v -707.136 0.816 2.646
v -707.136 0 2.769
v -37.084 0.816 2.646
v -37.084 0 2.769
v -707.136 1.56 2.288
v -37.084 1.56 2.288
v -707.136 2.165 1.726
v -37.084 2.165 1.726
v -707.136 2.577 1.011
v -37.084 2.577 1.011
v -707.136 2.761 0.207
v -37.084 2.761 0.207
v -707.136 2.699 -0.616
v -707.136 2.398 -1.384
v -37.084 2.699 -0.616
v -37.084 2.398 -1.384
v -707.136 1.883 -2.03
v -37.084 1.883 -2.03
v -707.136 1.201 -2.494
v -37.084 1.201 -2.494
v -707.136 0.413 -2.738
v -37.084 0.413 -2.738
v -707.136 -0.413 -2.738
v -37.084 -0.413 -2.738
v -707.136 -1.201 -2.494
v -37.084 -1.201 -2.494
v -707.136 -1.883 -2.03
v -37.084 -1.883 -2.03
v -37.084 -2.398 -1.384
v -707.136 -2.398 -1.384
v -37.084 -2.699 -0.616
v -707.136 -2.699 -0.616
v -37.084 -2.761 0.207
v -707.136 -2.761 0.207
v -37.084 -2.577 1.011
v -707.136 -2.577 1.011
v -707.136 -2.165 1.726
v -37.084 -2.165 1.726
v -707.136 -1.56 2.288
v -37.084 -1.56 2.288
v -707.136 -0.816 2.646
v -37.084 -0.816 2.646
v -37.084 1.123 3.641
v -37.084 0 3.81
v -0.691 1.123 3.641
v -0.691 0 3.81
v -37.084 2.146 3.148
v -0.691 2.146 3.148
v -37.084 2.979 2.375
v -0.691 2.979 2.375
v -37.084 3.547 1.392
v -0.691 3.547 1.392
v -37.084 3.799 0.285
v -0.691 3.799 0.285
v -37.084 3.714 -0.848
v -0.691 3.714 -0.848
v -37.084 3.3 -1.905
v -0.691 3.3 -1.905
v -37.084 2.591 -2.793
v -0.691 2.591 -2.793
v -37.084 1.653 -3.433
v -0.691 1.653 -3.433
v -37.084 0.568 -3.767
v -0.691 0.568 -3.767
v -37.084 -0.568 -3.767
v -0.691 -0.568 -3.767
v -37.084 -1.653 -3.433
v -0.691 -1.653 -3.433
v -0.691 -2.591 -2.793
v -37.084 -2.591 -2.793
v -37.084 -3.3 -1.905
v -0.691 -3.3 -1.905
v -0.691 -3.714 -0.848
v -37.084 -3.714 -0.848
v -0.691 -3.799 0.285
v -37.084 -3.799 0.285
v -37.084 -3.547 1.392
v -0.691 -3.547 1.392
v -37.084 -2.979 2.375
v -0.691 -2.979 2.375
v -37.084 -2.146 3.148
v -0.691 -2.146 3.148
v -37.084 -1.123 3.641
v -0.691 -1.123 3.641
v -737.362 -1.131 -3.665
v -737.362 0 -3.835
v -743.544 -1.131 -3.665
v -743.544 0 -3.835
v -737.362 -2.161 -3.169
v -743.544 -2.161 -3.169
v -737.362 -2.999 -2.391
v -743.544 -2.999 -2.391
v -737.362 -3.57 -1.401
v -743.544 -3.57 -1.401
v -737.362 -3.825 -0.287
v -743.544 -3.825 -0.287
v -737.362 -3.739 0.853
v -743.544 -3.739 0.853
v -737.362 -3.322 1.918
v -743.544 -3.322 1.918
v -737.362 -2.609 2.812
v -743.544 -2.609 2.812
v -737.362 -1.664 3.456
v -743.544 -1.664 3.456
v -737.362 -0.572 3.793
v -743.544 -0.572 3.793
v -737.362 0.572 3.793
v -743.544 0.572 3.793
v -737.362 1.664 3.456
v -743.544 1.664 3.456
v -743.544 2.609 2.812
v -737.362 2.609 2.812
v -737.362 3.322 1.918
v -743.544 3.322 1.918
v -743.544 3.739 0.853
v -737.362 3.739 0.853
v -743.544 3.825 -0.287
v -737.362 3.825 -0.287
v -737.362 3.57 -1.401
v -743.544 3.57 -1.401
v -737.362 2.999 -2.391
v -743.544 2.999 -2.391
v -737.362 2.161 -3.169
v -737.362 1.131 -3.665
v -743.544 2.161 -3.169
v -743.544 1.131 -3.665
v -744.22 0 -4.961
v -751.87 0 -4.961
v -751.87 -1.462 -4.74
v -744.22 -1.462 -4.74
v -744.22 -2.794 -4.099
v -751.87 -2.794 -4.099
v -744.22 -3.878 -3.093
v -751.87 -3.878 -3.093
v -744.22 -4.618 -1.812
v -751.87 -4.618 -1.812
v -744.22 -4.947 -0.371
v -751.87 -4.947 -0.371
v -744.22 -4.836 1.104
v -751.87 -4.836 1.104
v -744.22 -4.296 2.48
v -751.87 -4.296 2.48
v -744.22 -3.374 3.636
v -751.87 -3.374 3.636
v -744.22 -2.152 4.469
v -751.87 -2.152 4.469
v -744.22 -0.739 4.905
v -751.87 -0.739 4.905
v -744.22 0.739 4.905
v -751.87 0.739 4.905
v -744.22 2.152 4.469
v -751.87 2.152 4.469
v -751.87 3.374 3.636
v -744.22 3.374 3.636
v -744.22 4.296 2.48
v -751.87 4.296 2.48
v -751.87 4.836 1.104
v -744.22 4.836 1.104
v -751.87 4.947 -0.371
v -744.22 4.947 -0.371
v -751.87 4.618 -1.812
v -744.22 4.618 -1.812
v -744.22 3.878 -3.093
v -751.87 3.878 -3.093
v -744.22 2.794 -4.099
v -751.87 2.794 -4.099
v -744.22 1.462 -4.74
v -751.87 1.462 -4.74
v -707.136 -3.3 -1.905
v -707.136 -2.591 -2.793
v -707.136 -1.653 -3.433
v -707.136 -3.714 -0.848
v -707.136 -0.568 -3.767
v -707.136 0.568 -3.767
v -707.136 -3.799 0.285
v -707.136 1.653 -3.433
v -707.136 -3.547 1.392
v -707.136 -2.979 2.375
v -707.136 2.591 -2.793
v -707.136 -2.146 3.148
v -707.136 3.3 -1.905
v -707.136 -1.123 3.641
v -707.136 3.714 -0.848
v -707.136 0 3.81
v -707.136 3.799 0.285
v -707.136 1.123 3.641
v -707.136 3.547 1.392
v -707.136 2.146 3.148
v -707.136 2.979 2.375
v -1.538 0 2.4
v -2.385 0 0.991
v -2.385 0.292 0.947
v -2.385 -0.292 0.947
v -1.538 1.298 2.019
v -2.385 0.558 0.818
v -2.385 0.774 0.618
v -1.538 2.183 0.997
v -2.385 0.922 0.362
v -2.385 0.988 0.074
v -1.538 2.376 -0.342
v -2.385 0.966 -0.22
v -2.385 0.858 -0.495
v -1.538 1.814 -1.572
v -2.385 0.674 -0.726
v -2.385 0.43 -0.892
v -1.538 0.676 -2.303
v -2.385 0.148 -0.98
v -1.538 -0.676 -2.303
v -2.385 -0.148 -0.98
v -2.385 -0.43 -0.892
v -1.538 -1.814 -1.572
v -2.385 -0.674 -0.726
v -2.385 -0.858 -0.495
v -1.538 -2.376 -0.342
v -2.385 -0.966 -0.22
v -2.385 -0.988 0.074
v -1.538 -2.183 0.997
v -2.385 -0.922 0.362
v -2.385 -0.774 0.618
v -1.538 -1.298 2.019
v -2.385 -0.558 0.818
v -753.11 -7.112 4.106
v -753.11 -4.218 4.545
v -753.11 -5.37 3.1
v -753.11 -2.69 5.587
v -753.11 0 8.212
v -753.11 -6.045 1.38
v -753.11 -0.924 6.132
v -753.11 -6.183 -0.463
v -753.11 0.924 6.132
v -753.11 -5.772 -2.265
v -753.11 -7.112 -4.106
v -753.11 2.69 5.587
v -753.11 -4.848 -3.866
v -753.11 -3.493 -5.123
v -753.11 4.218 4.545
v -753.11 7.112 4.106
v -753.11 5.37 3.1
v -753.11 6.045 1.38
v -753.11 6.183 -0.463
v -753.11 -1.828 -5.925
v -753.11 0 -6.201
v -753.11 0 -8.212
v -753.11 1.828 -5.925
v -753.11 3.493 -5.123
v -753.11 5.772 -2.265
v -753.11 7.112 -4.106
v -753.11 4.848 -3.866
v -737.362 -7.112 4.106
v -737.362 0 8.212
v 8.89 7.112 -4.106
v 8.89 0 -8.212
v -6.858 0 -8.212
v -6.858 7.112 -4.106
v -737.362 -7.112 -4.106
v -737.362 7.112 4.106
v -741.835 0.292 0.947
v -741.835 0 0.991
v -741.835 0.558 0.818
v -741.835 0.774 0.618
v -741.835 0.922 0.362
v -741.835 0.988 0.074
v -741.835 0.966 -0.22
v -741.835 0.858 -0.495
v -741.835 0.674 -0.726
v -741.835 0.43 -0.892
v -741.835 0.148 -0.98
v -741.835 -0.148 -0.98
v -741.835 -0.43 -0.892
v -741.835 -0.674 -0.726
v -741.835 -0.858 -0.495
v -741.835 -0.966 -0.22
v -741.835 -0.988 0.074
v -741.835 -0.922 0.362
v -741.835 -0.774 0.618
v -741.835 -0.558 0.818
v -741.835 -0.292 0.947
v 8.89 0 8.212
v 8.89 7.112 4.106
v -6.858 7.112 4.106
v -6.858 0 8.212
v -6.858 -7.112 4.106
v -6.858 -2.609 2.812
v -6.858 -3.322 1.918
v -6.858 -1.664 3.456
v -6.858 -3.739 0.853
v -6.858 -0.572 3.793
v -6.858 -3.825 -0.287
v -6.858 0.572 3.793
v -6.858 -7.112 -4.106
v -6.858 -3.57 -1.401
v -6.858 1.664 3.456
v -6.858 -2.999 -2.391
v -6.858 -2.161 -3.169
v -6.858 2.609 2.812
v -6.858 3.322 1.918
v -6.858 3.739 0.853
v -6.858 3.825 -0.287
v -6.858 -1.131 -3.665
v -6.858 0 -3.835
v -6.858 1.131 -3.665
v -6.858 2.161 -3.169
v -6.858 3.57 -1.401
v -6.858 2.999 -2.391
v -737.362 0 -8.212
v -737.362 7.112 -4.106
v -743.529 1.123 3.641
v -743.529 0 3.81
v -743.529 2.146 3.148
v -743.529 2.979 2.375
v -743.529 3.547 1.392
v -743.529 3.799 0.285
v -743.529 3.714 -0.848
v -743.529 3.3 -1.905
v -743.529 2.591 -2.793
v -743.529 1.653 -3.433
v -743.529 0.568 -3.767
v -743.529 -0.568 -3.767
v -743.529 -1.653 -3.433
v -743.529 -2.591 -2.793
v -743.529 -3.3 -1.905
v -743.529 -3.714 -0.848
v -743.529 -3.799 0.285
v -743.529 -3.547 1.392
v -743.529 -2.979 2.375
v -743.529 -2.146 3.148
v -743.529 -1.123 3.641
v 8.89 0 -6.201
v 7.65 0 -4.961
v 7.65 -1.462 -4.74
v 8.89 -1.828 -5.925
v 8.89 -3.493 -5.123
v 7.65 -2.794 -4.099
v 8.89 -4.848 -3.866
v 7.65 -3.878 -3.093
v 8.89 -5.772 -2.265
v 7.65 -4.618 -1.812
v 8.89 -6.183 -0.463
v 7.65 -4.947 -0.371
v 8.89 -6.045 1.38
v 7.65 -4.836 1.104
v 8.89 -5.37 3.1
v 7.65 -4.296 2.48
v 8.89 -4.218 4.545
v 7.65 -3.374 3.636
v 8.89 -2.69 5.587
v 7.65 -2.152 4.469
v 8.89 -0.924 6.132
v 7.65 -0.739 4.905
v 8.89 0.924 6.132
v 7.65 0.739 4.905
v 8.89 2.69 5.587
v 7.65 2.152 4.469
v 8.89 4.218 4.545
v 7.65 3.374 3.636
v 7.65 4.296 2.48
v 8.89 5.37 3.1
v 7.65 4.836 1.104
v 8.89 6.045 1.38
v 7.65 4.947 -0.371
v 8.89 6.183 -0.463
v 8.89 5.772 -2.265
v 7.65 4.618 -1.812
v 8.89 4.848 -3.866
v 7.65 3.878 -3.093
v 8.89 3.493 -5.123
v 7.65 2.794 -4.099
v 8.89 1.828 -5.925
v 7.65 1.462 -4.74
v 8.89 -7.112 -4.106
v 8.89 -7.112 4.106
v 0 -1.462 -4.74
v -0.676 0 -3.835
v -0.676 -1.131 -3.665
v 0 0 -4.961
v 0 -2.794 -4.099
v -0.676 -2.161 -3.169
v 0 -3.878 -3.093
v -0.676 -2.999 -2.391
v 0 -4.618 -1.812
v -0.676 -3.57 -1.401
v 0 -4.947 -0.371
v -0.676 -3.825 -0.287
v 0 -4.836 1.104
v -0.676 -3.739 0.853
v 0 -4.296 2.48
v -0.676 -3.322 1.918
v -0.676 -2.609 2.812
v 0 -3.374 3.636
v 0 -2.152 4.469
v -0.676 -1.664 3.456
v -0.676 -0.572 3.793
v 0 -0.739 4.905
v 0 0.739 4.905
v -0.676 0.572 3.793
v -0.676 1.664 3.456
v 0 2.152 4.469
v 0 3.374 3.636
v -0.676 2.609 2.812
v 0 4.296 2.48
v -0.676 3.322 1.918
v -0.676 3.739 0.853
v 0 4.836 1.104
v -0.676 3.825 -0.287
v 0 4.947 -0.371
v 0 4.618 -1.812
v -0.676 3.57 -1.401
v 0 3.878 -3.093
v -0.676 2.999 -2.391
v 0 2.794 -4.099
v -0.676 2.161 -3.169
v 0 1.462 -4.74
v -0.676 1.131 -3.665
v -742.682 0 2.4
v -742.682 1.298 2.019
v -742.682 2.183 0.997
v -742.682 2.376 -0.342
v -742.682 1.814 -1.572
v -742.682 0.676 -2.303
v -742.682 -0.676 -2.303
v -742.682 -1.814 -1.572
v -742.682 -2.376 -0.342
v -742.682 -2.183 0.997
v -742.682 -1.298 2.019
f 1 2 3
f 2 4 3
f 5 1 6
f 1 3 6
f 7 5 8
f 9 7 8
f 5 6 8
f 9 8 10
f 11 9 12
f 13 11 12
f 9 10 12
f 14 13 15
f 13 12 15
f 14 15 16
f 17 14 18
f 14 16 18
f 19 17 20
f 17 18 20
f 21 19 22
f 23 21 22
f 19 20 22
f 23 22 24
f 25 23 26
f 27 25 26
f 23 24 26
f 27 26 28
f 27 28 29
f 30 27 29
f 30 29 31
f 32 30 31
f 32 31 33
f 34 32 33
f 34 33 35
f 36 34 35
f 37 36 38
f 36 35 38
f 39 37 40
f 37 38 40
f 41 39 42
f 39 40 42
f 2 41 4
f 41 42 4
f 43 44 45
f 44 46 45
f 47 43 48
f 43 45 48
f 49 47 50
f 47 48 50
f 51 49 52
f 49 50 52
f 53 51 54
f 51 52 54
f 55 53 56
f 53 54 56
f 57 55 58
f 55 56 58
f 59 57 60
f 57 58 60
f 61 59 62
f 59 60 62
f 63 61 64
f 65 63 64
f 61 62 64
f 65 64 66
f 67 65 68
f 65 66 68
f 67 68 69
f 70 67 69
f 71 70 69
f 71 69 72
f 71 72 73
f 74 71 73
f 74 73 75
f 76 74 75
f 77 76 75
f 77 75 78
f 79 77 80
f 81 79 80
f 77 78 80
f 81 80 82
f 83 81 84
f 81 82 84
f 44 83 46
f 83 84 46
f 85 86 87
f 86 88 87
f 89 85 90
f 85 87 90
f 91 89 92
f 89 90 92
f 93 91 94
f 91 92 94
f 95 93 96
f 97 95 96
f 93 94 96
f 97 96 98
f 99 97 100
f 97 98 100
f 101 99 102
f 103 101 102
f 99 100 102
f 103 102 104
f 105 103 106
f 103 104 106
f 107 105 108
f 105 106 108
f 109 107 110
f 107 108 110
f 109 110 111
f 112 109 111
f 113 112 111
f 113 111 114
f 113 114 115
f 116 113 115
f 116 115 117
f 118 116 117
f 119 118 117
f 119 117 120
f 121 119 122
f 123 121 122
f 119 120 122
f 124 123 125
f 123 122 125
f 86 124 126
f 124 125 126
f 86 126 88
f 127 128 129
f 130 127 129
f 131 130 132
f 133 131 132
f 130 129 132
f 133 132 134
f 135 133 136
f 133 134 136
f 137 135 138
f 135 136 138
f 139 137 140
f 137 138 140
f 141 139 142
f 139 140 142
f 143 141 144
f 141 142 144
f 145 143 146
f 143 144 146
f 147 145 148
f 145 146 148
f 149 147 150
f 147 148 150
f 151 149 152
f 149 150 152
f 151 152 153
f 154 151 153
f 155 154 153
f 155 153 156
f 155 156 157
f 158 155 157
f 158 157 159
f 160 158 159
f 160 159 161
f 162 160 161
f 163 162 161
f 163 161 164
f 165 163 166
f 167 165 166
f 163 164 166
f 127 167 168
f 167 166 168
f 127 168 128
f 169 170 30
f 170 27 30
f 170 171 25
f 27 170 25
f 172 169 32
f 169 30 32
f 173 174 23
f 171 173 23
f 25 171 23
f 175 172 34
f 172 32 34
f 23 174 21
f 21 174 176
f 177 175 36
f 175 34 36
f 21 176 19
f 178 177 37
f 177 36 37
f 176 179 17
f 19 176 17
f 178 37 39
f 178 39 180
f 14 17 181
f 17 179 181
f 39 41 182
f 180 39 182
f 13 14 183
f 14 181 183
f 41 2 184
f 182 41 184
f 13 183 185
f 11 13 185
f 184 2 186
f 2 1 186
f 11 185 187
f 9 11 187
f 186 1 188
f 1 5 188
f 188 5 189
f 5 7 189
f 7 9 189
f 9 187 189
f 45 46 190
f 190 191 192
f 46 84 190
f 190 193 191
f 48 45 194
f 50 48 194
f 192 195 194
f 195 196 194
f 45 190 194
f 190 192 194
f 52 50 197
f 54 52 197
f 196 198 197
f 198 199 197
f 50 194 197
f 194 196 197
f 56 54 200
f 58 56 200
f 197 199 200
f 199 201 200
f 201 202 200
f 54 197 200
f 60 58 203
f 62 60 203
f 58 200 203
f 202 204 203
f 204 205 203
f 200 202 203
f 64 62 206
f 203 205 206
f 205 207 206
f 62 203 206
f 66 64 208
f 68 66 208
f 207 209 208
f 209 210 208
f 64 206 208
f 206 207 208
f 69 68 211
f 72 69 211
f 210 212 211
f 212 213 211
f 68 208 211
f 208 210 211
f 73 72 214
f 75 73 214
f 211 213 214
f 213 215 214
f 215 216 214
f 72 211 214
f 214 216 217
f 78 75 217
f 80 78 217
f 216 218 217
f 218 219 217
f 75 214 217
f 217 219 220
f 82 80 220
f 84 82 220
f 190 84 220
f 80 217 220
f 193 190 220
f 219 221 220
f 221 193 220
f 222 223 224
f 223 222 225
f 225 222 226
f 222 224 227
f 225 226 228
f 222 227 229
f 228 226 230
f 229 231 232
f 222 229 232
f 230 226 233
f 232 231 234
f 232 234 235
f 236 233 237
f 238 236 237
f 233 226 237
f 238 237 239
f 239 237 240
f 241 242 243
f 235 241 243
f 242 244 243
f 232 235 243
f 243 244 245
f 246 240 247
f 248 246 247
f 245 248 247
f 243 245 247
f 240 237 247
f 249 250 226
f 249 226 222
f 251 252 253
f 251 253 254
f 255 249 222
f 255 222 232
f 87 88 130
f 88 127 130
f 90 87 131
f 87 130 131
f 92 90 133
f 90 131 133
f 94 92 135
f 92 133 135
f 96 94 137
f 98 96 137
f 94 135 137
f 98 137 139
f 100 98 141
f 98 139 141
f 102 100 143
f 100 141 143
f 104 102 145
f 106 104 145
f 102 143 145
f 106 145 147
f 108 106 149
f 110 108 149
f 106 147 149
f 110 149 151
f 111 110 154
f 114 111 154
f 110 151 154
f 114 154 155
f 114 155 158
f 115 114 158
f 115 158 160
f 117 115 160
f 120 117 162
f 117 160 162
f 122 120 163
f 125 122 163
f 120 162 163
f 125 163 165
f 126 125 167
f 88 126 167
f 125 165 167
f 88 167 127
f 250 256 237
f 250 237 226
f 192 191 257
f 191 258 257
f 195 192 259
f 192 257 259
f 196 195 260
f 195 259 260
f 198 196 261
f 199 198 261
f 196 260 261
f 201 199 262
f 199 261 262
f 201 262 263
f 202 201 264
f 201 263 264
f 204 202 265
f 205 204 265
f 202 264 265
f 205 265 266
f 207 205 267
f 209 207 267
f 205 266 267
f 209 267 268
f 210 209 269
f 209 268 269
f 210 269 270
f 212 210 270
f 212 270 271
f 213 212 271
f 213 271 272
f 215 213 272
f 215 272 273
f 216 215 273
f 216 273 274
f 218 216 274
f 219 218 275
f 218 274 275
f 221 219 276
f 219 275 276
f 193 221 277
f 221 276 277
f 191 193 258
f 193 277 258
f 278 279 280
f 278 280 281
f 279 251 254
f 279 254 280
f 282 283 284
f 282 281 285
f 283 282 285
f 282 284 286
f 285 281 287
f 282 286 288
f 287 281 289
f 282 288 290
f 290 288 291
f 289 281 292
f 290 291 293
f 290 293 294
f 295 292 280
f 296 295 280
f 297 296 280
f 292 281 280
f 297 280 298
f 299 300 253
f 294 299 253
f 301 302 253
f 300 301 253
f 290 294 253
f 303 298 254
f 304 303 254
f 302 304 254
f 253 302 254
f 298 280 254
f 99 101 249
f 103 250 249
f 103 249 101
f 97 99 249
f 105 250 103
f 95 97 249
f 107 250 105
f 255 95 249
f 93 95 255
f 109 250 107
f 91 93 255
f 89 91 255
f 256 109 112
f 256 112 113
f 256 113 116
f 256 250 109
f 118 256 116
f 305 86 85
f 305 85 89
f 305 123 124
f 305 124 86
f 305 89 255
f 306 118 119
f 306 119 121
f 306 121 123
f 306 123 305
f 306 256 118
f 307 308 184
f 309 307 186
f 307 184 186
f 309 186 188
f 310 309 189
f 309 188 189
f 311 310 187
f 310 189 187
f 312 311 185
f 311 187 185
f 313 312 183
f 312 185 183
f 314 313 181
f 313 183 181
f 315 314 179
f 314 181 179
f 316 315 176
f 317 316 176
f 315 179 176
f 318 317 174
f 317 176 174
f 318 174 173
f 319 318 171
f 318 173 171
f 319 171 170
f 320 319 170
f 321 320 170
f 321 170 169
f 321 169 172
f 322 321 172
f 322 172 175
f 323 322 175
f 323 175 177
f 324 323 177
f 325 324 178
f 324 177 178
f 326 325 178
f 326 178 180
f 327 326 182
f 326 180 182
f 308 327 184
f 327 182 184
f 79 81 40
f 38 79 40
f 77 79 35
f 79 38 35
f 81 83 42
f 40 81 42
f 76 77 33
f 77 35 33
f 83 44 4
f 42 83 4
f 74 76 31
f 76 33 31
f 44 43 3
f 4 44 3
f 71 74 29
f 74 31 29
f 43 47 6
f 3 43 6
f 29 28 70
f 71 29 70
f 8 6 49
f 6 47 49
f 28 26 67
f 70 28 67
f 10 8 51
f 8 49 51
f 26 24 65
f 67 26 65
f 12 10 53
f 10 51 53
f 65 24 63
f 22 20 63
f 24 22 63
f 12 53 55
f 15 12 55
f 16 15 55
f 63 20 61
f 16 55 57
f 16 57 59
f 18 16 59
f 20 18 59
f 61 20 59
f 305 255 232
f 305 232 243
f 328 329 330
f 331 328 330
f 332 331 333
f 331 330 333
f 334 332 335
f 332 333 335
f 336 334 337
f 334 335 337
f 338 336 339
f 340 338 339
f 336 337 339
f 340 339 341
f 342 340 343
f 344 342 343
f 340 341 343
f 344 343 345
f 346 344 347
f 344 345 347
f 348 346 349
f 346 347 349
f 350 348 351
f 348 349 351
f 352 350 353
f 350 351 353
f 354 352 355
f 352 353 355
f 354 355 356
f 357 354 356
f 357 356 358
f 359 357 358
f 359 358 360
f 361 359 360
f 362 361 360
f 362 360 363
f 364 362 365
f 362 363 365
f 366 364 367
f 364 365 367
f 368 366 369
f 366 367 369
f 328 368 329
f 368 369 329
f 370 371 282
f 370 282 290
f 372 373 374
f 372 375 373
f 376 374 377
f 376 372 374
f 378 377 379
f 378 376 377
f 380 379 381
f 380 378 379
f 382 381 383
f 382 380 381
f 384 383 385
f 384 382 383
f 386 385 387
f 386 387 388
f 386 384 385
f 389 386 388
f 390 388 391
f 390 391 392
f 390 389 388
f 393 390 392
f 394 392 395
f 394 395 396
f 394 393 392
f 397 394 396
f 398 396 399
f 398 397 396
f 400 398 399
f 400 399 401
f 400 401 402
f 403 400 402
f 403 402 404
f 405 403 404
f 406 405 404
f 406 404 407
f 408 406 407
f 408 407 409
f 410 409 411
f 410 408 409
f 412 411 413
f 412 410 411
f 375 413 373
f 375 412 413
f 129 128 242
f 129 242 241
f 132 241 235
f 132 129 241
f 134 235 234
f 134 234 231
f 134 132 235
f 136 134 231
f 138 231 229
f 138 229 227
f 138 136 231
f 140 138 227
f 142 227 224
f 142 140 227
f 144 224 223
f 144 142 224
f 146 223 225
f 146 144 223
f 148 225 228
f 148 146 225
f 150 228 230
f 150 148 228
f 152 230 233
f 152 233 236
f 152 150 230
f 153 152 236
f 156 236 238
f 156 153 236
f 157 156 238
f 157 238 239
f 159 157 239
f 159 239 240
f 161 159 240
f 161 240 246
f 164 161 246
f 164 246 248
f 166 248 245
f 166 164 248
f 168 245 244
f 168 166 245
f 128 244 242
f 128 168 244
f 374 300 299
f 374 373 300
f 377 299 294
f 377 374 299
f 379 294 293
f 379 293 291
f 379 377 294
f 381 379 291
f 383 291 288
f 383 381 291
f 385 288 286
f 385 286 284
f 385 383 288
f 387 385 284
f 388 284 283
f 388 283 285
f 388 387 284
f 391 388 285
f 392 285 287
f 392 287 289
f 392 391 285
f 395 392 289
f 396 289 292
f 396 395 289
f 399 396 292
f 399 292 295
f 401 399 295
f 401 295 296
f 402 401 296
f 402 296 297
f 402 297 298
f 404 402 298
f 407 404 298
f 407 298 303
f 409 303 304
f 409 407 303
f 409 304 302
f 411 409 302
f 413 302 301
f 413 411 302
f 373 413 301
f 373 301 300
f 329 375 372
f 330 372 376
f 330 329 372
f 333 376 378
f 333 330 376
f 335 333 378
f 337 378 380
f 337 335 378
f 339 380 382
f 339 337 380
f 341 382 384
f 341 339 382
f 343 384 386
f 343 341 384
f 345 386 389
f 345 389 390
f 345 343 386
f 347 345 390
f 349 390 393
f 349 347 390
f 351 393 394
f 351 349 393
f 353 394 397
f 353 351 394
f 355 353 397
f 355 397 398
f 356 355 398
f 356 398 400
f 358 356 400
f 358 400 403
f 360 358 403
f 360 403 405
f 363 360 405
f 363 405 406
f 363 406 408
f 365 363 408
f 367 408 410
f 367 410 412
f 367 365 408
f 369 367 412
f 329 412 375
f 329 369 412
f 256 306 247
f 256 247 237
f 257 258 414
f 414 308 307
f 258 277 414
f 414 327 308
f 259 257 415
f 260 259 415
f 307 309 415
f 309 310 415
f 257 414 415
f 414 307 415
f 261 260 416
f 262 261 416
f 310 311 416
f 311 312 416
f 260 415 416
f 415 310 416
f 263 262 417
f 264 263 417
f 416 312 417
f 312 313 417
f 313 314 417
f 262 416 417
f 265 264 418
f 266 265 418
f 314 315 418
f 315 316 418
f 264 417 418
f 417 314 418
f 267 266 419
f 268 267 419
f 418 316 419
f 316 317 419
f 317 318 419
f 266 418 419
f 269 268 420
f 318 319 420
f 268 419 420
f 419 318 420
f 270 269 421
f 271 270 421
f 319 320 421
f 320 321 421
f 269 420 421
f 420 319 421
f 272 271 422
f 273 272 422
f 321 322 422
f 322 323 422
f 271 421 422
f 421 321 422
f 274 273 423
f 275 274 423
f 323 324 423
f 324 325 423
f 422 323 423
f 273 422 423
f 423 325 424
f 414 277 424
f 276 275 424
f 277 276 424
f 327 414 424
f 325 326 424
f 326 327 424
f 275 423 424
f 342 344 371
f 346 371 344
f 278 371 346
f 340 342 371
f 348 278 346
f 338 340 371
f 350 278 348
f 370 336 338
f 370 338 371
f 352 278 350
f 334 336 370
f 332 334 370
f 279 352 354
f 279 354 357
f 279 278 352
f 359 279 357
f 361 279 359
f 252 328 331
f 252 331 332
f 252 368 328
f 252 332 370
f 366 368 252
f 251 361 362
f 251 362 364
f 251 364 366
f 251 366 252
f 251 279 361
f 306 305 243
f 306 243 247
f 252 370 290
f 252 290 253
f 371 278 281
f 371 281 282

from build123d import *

# Parameters (mm, degrees)
EXTRUDE2_DEPTH = 15.748
CHAMFER2_SIZE  = 1.240155


with BuildPart() as part:
    # Sketch5 → Extrude2 (new body)
    with BuildSketch(Plane(origin=(-6.858, 0, 0), x_dir=(0, 0, -1), z_dir=(1, 0, 0))):
        Polygon((4.106115114, 7.112), (-4.106115114, 7.112), (-8.212230229, 0), (-4.106115114, -7.112), (4.106115114, -7.112), (8.212230229, 0), align=None)
    extrude(amount=EXTRUDE2_DEPTH)

    # Sketch6 → Hole2 (revolve, cut)
    with BuildSketch(Plane(origin=(8.89, 0, 0), x_dir=(0, 0, -1), z_dir=(0, 1, 0))):
        Polygon((0, 0), (0, 15.748), (3.8354, 15.748), (3.8354, 9.566100386), (4.96062, 8.89), (4.96062, 0), align=None)
    revolve(axis=Axis((15.020023899, 0, 0), (-1, 0, 0)), mode=Mode.SUBTRACT)

    # Chamfer2
    chamfer2_edges = [part.edges().sort_by_distance(p)[0] for p in [
        (8.89, 0, 4.96062),
    ]]
    chamfer(chamfer2_edges, length=CHAMFER2_SIZE)


with BuildPart() as body_2:
    # Sketch8 → Revolve2 (revolve)
    with BuildSketch(Plane(origin=(0, 0, 0), x_dir=(-1, 0, 0), z_dir=(0, 0, -1)), mode=Mode.PRIVATE) as revolve2_sk:
        Polygon((0.691362245, 3.81), (2.385428675, 0.9906), (741.834571325, 0.9906), (743.528637755, 3.81), (707.136, 3.81), (707.136, 2.7686), (37.084, 2.7686), (37.084, 3.81), align=None)
    revolve(revolve2_sk.sketch.rotate(Axis((-0.691362245, 0, 0), (-1, 0, 0)), 270), axis=Axis((-0.691362245, 0, 0), (-1, 0, 0)))  # turned: the seam where the file's is


with BuildPart() as body_3:
    # Mirror2: mirrored copy
    add(part.part.mirror(Plane(origin=(-372.11, 0, 0), x_dir=(0, 0, 1), z_dir=(1, 0, 0))))


solid = Compound([part.part, body_2.part, body_3.part])
